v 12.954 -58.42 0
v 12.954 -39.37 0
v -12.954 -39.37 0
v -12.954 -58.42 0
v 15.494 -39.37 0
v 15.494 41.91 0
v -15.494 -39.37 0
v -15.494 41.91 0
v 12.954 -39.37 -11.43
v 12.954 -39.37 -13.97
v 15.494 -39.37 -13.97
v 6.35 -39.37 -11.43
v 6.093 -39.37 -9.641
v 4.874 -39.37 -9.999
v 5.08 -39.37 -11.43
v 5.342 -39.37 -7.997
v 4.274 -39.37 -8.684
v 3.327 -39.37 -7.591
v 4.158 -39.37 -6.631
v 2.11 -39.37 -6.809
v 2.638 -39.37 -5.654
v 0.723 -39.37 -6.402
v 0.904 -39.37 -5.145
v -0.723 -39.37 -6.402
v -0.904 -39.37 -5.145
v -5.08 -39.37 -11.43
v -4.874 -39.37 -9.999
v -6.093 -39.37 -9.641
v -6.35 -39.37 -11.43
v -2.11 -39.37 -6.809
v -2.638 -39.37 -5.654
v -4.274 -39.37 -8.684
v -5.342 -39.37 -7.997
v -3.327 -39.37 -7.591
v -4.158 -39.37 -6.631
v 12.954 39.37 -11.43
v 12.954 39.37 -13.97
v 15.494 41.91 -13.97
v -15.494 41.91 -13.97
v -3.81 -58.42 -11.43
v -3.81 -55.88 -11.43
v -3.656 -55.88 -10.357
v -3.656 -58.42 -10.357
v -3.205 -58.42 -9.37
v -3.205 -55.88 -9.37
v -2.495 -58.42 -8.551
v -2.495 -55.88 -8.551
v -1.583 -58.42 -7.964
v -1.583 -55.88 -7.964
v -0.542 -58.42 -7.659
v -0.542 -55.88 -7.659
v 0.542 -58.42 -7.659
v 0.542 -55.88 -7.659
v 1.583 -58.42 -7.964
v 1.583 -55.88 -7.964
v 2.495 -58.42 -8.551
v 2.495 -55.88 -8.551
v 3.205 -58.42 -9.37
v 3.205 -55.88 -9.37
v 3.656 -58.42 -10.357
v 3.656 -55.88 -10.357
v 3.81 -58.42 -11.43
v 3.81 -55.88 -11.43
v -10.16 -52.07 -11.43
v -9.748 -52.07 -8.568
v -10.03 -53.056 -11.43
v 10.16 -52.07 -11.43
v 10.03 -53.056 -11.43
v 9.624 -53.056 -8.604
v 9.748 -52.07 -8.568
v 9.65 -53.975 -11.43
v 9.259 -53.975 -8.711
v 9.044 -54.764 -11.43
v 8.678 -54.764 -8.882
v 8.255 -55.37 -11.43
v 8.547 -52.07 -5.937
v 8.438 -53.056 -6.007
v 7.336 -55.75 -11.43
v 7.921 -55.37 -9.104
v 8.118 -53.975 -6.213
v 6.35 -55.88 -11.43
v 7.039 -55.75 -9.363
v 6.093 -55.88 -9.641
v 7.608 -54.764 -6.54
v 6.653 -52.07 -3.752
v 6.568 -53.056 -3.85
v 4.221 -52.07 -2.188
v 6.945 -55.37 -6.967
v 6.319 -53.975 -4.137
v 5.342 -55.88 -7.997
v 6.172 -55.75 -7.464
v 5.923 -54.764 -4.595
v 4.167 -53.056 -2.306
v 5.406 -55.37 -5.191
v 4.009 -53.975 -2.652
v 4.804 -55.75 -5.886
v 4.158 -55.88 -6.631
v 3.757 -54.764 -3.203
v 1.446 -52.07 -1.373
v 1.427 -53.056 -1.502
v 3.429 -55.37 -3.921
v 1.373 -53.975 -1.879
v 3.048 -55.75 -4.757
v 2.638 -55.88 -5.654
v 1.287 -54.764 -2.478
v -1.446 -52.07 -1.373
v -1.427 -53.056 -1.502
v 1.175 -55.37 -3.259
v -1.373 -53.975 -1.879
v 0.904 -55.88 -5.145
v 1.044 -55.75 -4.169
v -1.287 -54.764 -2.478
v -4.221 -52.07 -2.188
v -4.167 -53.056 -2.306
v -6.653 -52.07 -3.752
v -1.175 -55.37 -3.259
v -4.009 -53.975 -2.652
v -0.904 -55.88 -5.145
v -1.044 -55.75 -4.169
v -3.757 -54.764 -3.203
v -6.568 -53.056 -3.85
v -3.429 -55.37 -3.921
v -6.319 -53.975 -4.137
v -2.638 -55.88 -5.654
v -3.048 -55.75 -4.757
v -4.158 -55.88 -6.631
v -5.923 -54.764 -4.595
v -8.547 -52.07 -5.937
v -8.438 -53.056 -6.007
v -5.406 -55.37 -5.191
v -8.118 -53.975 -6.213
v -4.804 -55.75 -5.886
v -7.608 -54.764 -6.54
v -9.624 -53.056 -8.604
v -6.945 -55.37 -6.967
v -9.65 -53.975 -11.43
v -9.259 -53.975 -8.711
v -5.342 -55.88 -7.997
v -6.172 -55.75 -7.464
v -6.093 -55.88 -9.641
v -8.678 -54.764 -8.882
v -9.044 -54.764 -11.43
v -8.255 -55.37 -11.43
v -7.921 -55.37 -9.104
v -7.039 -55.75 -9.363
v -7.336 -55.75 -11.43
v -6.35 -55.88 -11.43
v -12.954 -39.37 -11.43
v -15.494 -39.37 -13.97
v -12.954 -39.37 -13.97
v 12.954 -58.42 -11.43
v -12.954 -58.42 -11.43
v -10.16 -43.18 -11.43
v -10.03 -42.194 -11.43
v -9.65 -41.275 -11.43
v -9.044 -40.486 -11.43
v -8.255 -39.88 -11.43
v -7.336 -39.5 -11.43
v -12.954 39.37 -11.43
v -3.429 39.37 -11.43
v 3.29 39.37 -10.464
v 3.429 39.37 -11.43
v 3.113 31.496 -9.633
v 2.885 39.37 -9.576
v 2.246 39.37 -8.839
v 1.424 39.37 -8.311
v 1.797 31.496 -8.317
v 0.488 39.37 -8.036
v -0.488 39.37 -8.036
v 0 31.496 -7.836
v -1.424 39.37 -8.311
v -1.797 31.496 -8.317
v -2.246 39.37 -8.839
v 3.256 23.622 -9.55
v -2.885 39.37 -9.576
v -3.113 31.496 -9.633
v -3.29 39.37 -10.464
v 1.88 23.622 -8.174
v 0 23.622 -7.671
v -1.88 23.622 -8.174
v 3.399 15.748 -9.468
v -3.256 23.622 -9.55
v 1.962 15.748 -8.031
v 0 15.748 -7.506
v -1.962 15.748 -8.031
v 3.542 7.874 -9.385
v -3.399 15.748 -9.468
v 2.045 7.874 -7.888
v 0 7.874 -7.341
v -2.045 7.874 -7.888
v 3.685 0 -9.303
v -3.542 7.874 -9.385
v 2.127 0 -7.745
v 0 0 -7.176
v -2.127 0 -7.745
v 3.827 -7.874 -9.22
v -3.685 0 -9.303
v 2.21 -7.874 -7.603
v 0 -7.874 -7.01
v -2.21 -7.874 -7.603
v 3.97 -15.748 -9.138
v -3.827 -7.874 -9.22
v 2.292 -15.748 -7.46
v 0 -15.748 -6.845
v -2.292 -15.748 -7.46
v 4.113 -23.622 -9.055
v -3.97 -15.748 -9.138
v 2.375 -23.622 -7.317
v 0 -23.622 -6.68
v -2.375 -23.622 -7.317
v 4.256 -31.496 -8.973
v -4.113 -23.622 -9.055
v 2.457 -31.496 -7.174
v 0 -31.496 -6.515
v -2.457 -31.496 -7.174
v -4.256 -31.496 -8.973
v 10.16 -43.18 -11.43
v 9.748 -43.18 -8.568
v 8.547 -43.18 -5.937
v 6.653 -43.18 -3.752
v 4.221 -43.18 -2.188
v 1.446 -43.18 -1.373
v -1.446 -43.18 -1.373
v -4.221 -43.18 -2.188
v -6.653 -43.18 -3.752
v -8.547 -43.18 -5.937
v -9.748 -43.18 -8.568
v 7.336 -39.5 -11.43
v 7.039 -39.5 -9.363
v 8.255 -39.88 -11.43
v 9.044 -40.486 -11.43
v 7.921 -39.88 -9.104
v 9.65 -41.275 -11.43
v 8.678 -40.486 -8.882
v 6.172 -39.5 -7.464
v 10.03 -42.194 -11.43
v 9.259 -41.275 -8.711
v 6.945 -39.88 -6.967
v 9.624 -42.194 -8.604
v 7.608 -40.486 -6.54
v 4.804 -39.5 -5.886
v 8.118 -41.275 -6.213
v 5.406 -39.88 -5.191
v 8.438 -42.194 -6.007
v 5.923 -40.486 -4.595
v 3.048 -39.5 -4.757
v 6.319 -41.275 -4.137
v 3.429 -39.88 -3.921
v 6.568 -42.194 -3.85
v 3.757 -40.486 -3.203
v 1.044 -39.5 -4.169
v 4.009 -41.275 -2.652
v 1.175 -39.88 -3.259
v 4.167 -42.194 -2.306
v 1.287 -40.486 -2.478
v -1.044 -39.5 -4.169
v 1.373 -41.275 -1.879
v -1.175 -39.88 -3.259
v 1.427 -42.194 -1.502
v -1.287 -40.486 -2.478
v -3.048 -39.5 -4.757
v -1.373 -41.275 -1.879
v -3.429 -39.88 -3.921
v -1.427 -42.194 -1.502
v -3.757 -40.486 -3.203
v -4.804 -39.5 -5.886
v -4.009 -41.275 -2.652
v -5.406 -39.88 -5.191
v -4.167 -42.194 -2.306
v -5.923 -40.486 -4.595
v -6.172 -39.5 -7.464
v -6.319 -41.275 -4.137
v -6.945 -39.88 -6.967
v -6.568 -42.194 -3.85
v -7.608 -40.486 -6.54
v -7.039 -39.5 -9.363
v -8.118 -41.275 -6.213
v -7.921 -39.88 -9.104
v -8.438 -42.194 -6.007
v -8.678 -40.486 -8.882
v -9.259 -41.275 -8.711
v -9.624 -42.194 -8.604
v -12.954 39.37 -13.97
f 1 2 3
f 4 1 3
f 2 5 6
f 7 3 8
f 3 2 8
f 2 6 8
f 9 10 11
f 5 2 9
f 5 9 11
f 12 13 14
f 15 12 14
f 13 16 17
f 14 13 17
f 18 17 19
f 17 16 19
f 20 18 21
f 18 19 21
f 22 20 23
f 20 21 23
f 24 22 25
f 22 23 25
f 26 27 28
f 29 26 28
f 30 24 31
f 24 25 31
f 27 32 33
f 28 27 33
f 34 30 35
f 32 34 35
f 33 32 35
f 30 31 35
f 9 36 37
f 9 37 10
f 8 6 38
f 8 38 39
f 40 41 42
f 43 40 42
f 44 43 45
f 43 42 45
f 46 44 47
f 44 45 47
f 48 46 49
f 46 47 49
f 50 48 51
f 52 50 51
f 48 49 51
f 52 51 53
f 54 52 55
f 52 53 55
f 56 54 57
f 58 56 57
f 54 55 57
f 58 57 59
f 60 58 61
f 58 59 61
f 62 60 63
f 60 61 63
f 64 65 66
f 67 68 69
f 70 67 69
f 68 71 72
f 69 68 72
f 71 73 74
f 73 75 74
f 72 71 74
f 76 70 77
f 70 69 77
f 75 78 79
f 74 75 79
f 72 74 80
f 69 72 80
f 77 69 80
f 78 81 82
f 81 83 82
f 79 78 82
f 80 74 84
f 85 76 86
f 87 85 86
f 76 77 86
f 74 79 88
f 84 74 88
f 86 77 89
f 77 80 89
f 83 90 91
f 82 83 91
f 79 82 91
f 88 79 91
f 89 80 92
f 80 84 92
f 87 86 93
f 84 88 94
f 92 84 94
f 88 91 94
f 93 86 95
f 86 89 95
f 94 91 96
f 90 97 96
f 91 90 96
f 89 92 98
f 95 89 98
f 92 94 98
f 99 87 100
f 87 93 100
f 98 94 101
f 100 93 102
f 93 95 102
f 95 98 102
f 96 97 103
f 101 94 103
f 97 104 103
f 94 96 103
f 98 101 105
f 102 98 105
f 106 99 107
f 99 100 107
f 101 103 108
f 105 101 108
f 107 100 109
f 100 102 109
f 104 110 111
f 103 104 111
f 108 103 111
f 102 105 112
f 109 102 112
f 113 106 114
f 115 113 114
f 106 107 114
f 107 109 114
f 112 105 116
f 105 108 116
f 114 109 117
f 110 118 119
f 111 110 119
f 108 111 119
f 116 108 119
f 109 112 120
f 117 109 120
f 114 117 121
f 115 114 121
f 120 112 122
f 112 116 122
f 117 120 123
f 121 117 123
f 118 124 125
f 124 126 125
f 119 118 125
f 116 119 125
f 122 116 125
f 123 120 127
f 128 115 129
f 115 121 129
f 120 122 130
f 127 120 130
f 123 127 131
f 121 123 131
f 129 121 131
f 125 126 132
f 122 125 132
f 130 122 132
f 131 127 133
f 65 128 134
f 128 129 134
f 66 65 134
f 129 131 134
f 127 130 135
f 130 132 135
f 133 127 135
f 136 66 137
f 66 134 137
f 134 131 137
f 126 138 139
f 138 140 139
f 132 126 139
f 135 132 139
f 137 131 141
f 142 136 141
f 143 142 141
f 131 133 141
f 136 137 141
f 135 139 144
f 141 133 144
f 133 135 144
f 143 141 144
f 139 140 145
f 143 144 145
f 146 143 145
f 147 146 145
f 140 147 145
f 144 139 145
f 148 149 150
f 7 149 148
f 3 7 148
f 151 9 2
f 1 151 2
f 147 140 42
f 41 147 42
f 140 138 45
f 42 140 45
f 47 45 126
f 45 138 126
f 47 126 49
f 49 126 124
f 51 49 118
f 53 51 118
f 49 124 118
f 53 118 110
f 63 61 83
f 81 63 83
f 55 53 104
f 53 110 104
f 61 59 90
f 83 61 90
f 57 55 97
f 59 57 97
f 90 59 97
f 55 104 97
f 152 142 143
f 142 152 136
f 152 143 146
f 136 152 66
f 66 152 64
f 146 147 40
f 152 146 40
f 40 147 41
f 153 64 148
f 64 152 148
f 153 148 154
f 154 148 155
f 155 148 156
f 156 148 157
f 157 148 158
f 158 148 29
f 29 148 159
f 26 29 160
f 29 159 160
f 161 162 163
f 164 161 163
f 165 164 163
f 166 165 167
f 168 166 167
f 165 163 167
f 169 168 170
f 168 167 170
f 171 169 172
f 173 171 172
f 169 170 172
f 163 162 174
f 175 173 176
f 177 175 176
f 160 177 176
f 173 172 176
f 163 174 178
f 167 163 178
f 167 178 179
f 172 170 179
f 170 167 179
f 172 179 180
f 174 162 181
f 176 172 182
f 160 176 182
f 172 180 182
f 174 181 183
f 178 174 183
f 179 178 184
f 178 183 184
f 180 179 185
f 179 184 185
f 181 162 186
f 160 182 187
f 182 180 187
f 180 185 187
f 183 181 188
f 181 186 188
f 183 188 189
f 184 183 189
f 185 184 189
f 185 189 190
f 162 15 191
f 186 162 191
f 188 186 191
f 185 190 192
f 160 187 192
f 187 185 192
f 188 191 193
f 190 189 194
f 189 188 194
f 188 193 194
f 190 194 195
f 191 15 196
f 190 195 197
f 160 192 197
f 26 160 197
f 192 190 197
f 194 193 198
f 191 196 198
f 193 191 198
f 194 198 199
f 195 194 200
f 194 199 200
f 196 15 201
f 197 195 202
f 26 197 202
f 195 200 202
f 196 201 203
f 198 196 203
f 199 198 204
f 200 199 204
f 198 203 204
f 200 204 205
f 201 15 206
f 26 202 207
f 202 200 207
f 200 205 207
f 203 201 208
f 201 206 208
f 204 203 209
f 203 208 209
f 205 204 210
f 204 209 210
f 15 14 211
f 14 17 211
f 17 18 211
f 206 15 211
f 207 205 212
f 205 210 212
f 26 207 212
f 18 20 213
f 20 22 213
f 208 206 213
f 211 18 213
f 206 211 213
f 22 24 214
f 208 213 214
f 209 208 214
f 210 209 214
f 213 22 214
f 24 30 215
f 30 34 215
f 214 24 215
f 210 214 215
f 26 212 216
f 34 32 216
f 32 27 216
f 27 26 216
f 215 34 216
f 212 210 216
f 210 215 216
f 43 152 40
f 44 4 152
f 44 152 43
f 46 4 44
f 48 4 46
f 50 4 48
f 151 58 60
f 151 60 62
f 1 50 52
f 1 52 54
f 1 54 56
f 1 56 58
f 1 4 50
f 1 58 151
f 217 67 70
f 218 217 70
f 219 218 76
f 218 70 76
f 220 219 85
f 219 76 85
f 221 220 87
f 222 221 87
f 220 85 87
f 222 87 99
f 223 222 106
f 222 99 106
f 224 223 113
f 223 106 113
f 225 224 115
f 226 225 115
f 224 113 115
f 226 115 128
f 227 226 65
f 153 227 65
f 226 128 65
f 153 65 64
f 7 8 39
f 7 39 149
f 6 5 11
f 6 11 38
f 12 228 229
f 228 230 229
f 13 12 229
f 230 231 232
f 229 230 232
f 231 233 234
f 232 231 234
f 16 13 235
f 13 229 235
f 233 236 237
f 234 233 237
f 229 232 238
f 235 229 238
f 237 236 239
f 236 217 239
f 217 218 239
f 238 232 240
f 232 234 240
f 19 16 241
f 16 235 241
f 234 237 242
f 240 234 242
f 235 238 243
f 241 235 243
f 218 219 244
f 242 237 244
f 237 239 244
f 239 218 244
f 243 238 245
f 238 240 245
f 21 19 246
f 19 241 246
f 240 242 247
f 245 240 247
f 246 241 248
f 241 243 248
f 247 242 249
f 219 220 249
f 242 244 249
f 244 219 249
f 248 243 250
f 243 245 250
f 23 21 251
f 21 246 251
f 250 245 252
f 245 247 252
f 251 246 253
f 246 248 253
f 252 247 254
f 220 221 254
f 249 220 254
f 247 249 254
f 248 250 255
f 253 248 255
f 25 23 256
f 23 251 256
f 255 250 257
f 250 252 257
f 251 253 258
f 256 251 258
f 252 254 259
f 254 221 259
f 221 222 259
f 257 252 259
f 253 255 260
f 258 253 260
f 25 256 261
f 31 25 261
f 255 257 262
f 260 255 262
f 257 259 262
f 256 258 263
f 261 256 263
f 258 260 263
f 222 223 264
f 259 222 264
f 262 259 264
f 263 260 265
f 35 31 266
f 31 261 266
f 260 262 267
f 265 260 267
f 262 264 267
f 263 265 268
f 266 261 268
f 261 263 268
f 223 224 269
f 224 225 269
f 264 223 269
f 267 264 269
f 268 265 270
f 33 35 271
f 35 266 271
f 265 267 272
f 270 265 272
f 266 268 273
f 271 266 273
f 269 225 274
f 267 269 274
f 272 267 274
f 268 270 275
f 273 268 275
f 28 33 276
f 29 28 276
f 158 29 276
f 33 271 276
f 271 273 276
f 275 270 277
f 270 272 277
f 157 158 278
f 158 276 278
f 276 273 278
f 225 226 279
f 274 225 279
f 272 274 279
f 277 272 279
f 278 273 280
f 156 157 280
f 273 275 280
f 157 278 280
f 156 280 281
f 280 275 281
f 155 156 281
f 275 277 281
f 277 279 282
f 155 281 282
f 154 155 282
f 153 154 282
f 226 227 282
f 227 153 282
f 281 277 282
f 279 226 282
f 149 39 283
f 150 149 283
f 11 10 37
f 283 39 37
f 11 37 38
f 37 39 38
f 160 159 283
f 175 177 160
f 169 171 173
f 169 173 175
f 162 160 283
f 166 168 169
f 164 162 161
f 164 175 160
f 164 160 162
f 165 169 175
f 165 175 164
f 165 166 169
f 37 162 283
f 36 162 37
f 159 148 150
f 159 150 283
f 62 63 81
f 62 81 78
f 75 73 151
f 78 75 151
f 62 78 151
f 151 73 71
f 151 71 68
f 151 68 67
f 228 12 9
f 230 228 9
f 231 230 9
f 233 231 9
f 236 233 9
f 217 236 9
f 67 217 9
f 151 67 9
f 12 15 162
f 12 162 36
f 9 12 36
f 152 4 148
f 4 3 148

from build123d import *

# Parameters (mm, degrees)
F0_W      = 25.908
F0_H      = 78.74
F1_DEPTH  = 11.43
F3_DEPTH  = 13.97
F6_W      = 12.954
F6_H      = 16.51
F7_DEPTH  = 11.43
F11_DEPTH = 2.54


with BuildPart() as f1:
    # F0 (on Top) → F1 (new body)
    with BuildSketch(Plane.XY):
        Rectangle(F0_W, F0_H)
    extrude(amount=-F1_DEPTH)

    # F2 (on Top) → F3 (join)
    with BuildSketch(Plane.XY):
        Polygon((15.494, 41.91), (-15.494, 41.91), (-15.494, -39.37), (-12.954, -39.37), (-12.954, 39.37), (12.954, 39.37), (12.954, -39.37), (15.494, -39.37), align=None)
    extrude(amount=-F3_DEPTH)

    # F4 (on face) → F5 (revolve, cut)
    with BuildSketch(Plane(origin=(0, 0, -11.43), x_dir=(1, 0, 0), z_dir=(0, 0, -1))):
        Polygon((3.429, -39.37), (5.08, 39.37), (0, 39.37), (0, -39.37), align=None)
    revolve(axis=Axis((0, 0, -11.43), (0, -1, 0)), mode=Mode.SUBTRACT)

    # F6 (on Top) → F7 (join)
    with BuildSketch(Plane.XY):
        with Locations((6.477, -47.625)):
            Rectangle(F6_W, F6_H)
        with Locations((-6.477, -47.625)):
            Rectangle(F6_W, F6_H)
    extrude(amount=-F7_DEPTH)

    # F8 (on face) → F9 (revolve, cut)
    with BuildSketch(Plane(origin=(0, 0, -11.43), x_dir=(1, 0, 0), z_dir=(0, 0, -1))):
        with BuildLine():
            Line((6.35, 55.88), (0, 55.88))
            Line((0, 55.88), (0, 39.37))
            Line((0, 39.37), (5.08, 39.37))
            Line((5.08, 39.37), (6.35, 39.37))
            ThreePointArc((6.35, 39.37), (9.0440768363, 40.4859231637), (10.16, 43.18))
            Line((10.16, 43.18), (10.16, 52.07))
            ThreePointArc((10.16, 52.07), (9.0440768363, 54.7640768363), (6.35, 55.88))
        make_face()
    revolve(axis=Axis((0, -47.625, -11.43), (0, -1, 0)), mode=Mode.SUBTRACT)

    # F10 (on face) → F11 (join)
    with BuildSketch(Plane.XZ.offset(55.88)):
        with BuildLine():
            Line((12.954, 0), (-12.954, 0))
            Line((-12.954, 0), (-12.954, -11.43))
            Line((-12.954, -11.43), (-6.35, -11.43))
            ThreePointArc((-6.35, -11.43), (0, -5.08), (6.35, -11.43))
            Line((6.35, -11.43), (12.954, -11.43))
            Line((12.954, -11.43), (12.954, 0))
        make_face()
        with BuildLine():
            ThreePointArc((6.35, -11.43), (0, -5.08), (-6.35, -11.43))
            Line((-6.35, -11.43), (-3.81, -11.43))
            ThreePointArc((-3.81, -11.43), (0, -7.62), (3.81, -11.43))
            Line((3.81, -11.43), (6.35, -11.43))
        make_face()
    extrude(amount=F11_DEPTH)


solid = f1.part
